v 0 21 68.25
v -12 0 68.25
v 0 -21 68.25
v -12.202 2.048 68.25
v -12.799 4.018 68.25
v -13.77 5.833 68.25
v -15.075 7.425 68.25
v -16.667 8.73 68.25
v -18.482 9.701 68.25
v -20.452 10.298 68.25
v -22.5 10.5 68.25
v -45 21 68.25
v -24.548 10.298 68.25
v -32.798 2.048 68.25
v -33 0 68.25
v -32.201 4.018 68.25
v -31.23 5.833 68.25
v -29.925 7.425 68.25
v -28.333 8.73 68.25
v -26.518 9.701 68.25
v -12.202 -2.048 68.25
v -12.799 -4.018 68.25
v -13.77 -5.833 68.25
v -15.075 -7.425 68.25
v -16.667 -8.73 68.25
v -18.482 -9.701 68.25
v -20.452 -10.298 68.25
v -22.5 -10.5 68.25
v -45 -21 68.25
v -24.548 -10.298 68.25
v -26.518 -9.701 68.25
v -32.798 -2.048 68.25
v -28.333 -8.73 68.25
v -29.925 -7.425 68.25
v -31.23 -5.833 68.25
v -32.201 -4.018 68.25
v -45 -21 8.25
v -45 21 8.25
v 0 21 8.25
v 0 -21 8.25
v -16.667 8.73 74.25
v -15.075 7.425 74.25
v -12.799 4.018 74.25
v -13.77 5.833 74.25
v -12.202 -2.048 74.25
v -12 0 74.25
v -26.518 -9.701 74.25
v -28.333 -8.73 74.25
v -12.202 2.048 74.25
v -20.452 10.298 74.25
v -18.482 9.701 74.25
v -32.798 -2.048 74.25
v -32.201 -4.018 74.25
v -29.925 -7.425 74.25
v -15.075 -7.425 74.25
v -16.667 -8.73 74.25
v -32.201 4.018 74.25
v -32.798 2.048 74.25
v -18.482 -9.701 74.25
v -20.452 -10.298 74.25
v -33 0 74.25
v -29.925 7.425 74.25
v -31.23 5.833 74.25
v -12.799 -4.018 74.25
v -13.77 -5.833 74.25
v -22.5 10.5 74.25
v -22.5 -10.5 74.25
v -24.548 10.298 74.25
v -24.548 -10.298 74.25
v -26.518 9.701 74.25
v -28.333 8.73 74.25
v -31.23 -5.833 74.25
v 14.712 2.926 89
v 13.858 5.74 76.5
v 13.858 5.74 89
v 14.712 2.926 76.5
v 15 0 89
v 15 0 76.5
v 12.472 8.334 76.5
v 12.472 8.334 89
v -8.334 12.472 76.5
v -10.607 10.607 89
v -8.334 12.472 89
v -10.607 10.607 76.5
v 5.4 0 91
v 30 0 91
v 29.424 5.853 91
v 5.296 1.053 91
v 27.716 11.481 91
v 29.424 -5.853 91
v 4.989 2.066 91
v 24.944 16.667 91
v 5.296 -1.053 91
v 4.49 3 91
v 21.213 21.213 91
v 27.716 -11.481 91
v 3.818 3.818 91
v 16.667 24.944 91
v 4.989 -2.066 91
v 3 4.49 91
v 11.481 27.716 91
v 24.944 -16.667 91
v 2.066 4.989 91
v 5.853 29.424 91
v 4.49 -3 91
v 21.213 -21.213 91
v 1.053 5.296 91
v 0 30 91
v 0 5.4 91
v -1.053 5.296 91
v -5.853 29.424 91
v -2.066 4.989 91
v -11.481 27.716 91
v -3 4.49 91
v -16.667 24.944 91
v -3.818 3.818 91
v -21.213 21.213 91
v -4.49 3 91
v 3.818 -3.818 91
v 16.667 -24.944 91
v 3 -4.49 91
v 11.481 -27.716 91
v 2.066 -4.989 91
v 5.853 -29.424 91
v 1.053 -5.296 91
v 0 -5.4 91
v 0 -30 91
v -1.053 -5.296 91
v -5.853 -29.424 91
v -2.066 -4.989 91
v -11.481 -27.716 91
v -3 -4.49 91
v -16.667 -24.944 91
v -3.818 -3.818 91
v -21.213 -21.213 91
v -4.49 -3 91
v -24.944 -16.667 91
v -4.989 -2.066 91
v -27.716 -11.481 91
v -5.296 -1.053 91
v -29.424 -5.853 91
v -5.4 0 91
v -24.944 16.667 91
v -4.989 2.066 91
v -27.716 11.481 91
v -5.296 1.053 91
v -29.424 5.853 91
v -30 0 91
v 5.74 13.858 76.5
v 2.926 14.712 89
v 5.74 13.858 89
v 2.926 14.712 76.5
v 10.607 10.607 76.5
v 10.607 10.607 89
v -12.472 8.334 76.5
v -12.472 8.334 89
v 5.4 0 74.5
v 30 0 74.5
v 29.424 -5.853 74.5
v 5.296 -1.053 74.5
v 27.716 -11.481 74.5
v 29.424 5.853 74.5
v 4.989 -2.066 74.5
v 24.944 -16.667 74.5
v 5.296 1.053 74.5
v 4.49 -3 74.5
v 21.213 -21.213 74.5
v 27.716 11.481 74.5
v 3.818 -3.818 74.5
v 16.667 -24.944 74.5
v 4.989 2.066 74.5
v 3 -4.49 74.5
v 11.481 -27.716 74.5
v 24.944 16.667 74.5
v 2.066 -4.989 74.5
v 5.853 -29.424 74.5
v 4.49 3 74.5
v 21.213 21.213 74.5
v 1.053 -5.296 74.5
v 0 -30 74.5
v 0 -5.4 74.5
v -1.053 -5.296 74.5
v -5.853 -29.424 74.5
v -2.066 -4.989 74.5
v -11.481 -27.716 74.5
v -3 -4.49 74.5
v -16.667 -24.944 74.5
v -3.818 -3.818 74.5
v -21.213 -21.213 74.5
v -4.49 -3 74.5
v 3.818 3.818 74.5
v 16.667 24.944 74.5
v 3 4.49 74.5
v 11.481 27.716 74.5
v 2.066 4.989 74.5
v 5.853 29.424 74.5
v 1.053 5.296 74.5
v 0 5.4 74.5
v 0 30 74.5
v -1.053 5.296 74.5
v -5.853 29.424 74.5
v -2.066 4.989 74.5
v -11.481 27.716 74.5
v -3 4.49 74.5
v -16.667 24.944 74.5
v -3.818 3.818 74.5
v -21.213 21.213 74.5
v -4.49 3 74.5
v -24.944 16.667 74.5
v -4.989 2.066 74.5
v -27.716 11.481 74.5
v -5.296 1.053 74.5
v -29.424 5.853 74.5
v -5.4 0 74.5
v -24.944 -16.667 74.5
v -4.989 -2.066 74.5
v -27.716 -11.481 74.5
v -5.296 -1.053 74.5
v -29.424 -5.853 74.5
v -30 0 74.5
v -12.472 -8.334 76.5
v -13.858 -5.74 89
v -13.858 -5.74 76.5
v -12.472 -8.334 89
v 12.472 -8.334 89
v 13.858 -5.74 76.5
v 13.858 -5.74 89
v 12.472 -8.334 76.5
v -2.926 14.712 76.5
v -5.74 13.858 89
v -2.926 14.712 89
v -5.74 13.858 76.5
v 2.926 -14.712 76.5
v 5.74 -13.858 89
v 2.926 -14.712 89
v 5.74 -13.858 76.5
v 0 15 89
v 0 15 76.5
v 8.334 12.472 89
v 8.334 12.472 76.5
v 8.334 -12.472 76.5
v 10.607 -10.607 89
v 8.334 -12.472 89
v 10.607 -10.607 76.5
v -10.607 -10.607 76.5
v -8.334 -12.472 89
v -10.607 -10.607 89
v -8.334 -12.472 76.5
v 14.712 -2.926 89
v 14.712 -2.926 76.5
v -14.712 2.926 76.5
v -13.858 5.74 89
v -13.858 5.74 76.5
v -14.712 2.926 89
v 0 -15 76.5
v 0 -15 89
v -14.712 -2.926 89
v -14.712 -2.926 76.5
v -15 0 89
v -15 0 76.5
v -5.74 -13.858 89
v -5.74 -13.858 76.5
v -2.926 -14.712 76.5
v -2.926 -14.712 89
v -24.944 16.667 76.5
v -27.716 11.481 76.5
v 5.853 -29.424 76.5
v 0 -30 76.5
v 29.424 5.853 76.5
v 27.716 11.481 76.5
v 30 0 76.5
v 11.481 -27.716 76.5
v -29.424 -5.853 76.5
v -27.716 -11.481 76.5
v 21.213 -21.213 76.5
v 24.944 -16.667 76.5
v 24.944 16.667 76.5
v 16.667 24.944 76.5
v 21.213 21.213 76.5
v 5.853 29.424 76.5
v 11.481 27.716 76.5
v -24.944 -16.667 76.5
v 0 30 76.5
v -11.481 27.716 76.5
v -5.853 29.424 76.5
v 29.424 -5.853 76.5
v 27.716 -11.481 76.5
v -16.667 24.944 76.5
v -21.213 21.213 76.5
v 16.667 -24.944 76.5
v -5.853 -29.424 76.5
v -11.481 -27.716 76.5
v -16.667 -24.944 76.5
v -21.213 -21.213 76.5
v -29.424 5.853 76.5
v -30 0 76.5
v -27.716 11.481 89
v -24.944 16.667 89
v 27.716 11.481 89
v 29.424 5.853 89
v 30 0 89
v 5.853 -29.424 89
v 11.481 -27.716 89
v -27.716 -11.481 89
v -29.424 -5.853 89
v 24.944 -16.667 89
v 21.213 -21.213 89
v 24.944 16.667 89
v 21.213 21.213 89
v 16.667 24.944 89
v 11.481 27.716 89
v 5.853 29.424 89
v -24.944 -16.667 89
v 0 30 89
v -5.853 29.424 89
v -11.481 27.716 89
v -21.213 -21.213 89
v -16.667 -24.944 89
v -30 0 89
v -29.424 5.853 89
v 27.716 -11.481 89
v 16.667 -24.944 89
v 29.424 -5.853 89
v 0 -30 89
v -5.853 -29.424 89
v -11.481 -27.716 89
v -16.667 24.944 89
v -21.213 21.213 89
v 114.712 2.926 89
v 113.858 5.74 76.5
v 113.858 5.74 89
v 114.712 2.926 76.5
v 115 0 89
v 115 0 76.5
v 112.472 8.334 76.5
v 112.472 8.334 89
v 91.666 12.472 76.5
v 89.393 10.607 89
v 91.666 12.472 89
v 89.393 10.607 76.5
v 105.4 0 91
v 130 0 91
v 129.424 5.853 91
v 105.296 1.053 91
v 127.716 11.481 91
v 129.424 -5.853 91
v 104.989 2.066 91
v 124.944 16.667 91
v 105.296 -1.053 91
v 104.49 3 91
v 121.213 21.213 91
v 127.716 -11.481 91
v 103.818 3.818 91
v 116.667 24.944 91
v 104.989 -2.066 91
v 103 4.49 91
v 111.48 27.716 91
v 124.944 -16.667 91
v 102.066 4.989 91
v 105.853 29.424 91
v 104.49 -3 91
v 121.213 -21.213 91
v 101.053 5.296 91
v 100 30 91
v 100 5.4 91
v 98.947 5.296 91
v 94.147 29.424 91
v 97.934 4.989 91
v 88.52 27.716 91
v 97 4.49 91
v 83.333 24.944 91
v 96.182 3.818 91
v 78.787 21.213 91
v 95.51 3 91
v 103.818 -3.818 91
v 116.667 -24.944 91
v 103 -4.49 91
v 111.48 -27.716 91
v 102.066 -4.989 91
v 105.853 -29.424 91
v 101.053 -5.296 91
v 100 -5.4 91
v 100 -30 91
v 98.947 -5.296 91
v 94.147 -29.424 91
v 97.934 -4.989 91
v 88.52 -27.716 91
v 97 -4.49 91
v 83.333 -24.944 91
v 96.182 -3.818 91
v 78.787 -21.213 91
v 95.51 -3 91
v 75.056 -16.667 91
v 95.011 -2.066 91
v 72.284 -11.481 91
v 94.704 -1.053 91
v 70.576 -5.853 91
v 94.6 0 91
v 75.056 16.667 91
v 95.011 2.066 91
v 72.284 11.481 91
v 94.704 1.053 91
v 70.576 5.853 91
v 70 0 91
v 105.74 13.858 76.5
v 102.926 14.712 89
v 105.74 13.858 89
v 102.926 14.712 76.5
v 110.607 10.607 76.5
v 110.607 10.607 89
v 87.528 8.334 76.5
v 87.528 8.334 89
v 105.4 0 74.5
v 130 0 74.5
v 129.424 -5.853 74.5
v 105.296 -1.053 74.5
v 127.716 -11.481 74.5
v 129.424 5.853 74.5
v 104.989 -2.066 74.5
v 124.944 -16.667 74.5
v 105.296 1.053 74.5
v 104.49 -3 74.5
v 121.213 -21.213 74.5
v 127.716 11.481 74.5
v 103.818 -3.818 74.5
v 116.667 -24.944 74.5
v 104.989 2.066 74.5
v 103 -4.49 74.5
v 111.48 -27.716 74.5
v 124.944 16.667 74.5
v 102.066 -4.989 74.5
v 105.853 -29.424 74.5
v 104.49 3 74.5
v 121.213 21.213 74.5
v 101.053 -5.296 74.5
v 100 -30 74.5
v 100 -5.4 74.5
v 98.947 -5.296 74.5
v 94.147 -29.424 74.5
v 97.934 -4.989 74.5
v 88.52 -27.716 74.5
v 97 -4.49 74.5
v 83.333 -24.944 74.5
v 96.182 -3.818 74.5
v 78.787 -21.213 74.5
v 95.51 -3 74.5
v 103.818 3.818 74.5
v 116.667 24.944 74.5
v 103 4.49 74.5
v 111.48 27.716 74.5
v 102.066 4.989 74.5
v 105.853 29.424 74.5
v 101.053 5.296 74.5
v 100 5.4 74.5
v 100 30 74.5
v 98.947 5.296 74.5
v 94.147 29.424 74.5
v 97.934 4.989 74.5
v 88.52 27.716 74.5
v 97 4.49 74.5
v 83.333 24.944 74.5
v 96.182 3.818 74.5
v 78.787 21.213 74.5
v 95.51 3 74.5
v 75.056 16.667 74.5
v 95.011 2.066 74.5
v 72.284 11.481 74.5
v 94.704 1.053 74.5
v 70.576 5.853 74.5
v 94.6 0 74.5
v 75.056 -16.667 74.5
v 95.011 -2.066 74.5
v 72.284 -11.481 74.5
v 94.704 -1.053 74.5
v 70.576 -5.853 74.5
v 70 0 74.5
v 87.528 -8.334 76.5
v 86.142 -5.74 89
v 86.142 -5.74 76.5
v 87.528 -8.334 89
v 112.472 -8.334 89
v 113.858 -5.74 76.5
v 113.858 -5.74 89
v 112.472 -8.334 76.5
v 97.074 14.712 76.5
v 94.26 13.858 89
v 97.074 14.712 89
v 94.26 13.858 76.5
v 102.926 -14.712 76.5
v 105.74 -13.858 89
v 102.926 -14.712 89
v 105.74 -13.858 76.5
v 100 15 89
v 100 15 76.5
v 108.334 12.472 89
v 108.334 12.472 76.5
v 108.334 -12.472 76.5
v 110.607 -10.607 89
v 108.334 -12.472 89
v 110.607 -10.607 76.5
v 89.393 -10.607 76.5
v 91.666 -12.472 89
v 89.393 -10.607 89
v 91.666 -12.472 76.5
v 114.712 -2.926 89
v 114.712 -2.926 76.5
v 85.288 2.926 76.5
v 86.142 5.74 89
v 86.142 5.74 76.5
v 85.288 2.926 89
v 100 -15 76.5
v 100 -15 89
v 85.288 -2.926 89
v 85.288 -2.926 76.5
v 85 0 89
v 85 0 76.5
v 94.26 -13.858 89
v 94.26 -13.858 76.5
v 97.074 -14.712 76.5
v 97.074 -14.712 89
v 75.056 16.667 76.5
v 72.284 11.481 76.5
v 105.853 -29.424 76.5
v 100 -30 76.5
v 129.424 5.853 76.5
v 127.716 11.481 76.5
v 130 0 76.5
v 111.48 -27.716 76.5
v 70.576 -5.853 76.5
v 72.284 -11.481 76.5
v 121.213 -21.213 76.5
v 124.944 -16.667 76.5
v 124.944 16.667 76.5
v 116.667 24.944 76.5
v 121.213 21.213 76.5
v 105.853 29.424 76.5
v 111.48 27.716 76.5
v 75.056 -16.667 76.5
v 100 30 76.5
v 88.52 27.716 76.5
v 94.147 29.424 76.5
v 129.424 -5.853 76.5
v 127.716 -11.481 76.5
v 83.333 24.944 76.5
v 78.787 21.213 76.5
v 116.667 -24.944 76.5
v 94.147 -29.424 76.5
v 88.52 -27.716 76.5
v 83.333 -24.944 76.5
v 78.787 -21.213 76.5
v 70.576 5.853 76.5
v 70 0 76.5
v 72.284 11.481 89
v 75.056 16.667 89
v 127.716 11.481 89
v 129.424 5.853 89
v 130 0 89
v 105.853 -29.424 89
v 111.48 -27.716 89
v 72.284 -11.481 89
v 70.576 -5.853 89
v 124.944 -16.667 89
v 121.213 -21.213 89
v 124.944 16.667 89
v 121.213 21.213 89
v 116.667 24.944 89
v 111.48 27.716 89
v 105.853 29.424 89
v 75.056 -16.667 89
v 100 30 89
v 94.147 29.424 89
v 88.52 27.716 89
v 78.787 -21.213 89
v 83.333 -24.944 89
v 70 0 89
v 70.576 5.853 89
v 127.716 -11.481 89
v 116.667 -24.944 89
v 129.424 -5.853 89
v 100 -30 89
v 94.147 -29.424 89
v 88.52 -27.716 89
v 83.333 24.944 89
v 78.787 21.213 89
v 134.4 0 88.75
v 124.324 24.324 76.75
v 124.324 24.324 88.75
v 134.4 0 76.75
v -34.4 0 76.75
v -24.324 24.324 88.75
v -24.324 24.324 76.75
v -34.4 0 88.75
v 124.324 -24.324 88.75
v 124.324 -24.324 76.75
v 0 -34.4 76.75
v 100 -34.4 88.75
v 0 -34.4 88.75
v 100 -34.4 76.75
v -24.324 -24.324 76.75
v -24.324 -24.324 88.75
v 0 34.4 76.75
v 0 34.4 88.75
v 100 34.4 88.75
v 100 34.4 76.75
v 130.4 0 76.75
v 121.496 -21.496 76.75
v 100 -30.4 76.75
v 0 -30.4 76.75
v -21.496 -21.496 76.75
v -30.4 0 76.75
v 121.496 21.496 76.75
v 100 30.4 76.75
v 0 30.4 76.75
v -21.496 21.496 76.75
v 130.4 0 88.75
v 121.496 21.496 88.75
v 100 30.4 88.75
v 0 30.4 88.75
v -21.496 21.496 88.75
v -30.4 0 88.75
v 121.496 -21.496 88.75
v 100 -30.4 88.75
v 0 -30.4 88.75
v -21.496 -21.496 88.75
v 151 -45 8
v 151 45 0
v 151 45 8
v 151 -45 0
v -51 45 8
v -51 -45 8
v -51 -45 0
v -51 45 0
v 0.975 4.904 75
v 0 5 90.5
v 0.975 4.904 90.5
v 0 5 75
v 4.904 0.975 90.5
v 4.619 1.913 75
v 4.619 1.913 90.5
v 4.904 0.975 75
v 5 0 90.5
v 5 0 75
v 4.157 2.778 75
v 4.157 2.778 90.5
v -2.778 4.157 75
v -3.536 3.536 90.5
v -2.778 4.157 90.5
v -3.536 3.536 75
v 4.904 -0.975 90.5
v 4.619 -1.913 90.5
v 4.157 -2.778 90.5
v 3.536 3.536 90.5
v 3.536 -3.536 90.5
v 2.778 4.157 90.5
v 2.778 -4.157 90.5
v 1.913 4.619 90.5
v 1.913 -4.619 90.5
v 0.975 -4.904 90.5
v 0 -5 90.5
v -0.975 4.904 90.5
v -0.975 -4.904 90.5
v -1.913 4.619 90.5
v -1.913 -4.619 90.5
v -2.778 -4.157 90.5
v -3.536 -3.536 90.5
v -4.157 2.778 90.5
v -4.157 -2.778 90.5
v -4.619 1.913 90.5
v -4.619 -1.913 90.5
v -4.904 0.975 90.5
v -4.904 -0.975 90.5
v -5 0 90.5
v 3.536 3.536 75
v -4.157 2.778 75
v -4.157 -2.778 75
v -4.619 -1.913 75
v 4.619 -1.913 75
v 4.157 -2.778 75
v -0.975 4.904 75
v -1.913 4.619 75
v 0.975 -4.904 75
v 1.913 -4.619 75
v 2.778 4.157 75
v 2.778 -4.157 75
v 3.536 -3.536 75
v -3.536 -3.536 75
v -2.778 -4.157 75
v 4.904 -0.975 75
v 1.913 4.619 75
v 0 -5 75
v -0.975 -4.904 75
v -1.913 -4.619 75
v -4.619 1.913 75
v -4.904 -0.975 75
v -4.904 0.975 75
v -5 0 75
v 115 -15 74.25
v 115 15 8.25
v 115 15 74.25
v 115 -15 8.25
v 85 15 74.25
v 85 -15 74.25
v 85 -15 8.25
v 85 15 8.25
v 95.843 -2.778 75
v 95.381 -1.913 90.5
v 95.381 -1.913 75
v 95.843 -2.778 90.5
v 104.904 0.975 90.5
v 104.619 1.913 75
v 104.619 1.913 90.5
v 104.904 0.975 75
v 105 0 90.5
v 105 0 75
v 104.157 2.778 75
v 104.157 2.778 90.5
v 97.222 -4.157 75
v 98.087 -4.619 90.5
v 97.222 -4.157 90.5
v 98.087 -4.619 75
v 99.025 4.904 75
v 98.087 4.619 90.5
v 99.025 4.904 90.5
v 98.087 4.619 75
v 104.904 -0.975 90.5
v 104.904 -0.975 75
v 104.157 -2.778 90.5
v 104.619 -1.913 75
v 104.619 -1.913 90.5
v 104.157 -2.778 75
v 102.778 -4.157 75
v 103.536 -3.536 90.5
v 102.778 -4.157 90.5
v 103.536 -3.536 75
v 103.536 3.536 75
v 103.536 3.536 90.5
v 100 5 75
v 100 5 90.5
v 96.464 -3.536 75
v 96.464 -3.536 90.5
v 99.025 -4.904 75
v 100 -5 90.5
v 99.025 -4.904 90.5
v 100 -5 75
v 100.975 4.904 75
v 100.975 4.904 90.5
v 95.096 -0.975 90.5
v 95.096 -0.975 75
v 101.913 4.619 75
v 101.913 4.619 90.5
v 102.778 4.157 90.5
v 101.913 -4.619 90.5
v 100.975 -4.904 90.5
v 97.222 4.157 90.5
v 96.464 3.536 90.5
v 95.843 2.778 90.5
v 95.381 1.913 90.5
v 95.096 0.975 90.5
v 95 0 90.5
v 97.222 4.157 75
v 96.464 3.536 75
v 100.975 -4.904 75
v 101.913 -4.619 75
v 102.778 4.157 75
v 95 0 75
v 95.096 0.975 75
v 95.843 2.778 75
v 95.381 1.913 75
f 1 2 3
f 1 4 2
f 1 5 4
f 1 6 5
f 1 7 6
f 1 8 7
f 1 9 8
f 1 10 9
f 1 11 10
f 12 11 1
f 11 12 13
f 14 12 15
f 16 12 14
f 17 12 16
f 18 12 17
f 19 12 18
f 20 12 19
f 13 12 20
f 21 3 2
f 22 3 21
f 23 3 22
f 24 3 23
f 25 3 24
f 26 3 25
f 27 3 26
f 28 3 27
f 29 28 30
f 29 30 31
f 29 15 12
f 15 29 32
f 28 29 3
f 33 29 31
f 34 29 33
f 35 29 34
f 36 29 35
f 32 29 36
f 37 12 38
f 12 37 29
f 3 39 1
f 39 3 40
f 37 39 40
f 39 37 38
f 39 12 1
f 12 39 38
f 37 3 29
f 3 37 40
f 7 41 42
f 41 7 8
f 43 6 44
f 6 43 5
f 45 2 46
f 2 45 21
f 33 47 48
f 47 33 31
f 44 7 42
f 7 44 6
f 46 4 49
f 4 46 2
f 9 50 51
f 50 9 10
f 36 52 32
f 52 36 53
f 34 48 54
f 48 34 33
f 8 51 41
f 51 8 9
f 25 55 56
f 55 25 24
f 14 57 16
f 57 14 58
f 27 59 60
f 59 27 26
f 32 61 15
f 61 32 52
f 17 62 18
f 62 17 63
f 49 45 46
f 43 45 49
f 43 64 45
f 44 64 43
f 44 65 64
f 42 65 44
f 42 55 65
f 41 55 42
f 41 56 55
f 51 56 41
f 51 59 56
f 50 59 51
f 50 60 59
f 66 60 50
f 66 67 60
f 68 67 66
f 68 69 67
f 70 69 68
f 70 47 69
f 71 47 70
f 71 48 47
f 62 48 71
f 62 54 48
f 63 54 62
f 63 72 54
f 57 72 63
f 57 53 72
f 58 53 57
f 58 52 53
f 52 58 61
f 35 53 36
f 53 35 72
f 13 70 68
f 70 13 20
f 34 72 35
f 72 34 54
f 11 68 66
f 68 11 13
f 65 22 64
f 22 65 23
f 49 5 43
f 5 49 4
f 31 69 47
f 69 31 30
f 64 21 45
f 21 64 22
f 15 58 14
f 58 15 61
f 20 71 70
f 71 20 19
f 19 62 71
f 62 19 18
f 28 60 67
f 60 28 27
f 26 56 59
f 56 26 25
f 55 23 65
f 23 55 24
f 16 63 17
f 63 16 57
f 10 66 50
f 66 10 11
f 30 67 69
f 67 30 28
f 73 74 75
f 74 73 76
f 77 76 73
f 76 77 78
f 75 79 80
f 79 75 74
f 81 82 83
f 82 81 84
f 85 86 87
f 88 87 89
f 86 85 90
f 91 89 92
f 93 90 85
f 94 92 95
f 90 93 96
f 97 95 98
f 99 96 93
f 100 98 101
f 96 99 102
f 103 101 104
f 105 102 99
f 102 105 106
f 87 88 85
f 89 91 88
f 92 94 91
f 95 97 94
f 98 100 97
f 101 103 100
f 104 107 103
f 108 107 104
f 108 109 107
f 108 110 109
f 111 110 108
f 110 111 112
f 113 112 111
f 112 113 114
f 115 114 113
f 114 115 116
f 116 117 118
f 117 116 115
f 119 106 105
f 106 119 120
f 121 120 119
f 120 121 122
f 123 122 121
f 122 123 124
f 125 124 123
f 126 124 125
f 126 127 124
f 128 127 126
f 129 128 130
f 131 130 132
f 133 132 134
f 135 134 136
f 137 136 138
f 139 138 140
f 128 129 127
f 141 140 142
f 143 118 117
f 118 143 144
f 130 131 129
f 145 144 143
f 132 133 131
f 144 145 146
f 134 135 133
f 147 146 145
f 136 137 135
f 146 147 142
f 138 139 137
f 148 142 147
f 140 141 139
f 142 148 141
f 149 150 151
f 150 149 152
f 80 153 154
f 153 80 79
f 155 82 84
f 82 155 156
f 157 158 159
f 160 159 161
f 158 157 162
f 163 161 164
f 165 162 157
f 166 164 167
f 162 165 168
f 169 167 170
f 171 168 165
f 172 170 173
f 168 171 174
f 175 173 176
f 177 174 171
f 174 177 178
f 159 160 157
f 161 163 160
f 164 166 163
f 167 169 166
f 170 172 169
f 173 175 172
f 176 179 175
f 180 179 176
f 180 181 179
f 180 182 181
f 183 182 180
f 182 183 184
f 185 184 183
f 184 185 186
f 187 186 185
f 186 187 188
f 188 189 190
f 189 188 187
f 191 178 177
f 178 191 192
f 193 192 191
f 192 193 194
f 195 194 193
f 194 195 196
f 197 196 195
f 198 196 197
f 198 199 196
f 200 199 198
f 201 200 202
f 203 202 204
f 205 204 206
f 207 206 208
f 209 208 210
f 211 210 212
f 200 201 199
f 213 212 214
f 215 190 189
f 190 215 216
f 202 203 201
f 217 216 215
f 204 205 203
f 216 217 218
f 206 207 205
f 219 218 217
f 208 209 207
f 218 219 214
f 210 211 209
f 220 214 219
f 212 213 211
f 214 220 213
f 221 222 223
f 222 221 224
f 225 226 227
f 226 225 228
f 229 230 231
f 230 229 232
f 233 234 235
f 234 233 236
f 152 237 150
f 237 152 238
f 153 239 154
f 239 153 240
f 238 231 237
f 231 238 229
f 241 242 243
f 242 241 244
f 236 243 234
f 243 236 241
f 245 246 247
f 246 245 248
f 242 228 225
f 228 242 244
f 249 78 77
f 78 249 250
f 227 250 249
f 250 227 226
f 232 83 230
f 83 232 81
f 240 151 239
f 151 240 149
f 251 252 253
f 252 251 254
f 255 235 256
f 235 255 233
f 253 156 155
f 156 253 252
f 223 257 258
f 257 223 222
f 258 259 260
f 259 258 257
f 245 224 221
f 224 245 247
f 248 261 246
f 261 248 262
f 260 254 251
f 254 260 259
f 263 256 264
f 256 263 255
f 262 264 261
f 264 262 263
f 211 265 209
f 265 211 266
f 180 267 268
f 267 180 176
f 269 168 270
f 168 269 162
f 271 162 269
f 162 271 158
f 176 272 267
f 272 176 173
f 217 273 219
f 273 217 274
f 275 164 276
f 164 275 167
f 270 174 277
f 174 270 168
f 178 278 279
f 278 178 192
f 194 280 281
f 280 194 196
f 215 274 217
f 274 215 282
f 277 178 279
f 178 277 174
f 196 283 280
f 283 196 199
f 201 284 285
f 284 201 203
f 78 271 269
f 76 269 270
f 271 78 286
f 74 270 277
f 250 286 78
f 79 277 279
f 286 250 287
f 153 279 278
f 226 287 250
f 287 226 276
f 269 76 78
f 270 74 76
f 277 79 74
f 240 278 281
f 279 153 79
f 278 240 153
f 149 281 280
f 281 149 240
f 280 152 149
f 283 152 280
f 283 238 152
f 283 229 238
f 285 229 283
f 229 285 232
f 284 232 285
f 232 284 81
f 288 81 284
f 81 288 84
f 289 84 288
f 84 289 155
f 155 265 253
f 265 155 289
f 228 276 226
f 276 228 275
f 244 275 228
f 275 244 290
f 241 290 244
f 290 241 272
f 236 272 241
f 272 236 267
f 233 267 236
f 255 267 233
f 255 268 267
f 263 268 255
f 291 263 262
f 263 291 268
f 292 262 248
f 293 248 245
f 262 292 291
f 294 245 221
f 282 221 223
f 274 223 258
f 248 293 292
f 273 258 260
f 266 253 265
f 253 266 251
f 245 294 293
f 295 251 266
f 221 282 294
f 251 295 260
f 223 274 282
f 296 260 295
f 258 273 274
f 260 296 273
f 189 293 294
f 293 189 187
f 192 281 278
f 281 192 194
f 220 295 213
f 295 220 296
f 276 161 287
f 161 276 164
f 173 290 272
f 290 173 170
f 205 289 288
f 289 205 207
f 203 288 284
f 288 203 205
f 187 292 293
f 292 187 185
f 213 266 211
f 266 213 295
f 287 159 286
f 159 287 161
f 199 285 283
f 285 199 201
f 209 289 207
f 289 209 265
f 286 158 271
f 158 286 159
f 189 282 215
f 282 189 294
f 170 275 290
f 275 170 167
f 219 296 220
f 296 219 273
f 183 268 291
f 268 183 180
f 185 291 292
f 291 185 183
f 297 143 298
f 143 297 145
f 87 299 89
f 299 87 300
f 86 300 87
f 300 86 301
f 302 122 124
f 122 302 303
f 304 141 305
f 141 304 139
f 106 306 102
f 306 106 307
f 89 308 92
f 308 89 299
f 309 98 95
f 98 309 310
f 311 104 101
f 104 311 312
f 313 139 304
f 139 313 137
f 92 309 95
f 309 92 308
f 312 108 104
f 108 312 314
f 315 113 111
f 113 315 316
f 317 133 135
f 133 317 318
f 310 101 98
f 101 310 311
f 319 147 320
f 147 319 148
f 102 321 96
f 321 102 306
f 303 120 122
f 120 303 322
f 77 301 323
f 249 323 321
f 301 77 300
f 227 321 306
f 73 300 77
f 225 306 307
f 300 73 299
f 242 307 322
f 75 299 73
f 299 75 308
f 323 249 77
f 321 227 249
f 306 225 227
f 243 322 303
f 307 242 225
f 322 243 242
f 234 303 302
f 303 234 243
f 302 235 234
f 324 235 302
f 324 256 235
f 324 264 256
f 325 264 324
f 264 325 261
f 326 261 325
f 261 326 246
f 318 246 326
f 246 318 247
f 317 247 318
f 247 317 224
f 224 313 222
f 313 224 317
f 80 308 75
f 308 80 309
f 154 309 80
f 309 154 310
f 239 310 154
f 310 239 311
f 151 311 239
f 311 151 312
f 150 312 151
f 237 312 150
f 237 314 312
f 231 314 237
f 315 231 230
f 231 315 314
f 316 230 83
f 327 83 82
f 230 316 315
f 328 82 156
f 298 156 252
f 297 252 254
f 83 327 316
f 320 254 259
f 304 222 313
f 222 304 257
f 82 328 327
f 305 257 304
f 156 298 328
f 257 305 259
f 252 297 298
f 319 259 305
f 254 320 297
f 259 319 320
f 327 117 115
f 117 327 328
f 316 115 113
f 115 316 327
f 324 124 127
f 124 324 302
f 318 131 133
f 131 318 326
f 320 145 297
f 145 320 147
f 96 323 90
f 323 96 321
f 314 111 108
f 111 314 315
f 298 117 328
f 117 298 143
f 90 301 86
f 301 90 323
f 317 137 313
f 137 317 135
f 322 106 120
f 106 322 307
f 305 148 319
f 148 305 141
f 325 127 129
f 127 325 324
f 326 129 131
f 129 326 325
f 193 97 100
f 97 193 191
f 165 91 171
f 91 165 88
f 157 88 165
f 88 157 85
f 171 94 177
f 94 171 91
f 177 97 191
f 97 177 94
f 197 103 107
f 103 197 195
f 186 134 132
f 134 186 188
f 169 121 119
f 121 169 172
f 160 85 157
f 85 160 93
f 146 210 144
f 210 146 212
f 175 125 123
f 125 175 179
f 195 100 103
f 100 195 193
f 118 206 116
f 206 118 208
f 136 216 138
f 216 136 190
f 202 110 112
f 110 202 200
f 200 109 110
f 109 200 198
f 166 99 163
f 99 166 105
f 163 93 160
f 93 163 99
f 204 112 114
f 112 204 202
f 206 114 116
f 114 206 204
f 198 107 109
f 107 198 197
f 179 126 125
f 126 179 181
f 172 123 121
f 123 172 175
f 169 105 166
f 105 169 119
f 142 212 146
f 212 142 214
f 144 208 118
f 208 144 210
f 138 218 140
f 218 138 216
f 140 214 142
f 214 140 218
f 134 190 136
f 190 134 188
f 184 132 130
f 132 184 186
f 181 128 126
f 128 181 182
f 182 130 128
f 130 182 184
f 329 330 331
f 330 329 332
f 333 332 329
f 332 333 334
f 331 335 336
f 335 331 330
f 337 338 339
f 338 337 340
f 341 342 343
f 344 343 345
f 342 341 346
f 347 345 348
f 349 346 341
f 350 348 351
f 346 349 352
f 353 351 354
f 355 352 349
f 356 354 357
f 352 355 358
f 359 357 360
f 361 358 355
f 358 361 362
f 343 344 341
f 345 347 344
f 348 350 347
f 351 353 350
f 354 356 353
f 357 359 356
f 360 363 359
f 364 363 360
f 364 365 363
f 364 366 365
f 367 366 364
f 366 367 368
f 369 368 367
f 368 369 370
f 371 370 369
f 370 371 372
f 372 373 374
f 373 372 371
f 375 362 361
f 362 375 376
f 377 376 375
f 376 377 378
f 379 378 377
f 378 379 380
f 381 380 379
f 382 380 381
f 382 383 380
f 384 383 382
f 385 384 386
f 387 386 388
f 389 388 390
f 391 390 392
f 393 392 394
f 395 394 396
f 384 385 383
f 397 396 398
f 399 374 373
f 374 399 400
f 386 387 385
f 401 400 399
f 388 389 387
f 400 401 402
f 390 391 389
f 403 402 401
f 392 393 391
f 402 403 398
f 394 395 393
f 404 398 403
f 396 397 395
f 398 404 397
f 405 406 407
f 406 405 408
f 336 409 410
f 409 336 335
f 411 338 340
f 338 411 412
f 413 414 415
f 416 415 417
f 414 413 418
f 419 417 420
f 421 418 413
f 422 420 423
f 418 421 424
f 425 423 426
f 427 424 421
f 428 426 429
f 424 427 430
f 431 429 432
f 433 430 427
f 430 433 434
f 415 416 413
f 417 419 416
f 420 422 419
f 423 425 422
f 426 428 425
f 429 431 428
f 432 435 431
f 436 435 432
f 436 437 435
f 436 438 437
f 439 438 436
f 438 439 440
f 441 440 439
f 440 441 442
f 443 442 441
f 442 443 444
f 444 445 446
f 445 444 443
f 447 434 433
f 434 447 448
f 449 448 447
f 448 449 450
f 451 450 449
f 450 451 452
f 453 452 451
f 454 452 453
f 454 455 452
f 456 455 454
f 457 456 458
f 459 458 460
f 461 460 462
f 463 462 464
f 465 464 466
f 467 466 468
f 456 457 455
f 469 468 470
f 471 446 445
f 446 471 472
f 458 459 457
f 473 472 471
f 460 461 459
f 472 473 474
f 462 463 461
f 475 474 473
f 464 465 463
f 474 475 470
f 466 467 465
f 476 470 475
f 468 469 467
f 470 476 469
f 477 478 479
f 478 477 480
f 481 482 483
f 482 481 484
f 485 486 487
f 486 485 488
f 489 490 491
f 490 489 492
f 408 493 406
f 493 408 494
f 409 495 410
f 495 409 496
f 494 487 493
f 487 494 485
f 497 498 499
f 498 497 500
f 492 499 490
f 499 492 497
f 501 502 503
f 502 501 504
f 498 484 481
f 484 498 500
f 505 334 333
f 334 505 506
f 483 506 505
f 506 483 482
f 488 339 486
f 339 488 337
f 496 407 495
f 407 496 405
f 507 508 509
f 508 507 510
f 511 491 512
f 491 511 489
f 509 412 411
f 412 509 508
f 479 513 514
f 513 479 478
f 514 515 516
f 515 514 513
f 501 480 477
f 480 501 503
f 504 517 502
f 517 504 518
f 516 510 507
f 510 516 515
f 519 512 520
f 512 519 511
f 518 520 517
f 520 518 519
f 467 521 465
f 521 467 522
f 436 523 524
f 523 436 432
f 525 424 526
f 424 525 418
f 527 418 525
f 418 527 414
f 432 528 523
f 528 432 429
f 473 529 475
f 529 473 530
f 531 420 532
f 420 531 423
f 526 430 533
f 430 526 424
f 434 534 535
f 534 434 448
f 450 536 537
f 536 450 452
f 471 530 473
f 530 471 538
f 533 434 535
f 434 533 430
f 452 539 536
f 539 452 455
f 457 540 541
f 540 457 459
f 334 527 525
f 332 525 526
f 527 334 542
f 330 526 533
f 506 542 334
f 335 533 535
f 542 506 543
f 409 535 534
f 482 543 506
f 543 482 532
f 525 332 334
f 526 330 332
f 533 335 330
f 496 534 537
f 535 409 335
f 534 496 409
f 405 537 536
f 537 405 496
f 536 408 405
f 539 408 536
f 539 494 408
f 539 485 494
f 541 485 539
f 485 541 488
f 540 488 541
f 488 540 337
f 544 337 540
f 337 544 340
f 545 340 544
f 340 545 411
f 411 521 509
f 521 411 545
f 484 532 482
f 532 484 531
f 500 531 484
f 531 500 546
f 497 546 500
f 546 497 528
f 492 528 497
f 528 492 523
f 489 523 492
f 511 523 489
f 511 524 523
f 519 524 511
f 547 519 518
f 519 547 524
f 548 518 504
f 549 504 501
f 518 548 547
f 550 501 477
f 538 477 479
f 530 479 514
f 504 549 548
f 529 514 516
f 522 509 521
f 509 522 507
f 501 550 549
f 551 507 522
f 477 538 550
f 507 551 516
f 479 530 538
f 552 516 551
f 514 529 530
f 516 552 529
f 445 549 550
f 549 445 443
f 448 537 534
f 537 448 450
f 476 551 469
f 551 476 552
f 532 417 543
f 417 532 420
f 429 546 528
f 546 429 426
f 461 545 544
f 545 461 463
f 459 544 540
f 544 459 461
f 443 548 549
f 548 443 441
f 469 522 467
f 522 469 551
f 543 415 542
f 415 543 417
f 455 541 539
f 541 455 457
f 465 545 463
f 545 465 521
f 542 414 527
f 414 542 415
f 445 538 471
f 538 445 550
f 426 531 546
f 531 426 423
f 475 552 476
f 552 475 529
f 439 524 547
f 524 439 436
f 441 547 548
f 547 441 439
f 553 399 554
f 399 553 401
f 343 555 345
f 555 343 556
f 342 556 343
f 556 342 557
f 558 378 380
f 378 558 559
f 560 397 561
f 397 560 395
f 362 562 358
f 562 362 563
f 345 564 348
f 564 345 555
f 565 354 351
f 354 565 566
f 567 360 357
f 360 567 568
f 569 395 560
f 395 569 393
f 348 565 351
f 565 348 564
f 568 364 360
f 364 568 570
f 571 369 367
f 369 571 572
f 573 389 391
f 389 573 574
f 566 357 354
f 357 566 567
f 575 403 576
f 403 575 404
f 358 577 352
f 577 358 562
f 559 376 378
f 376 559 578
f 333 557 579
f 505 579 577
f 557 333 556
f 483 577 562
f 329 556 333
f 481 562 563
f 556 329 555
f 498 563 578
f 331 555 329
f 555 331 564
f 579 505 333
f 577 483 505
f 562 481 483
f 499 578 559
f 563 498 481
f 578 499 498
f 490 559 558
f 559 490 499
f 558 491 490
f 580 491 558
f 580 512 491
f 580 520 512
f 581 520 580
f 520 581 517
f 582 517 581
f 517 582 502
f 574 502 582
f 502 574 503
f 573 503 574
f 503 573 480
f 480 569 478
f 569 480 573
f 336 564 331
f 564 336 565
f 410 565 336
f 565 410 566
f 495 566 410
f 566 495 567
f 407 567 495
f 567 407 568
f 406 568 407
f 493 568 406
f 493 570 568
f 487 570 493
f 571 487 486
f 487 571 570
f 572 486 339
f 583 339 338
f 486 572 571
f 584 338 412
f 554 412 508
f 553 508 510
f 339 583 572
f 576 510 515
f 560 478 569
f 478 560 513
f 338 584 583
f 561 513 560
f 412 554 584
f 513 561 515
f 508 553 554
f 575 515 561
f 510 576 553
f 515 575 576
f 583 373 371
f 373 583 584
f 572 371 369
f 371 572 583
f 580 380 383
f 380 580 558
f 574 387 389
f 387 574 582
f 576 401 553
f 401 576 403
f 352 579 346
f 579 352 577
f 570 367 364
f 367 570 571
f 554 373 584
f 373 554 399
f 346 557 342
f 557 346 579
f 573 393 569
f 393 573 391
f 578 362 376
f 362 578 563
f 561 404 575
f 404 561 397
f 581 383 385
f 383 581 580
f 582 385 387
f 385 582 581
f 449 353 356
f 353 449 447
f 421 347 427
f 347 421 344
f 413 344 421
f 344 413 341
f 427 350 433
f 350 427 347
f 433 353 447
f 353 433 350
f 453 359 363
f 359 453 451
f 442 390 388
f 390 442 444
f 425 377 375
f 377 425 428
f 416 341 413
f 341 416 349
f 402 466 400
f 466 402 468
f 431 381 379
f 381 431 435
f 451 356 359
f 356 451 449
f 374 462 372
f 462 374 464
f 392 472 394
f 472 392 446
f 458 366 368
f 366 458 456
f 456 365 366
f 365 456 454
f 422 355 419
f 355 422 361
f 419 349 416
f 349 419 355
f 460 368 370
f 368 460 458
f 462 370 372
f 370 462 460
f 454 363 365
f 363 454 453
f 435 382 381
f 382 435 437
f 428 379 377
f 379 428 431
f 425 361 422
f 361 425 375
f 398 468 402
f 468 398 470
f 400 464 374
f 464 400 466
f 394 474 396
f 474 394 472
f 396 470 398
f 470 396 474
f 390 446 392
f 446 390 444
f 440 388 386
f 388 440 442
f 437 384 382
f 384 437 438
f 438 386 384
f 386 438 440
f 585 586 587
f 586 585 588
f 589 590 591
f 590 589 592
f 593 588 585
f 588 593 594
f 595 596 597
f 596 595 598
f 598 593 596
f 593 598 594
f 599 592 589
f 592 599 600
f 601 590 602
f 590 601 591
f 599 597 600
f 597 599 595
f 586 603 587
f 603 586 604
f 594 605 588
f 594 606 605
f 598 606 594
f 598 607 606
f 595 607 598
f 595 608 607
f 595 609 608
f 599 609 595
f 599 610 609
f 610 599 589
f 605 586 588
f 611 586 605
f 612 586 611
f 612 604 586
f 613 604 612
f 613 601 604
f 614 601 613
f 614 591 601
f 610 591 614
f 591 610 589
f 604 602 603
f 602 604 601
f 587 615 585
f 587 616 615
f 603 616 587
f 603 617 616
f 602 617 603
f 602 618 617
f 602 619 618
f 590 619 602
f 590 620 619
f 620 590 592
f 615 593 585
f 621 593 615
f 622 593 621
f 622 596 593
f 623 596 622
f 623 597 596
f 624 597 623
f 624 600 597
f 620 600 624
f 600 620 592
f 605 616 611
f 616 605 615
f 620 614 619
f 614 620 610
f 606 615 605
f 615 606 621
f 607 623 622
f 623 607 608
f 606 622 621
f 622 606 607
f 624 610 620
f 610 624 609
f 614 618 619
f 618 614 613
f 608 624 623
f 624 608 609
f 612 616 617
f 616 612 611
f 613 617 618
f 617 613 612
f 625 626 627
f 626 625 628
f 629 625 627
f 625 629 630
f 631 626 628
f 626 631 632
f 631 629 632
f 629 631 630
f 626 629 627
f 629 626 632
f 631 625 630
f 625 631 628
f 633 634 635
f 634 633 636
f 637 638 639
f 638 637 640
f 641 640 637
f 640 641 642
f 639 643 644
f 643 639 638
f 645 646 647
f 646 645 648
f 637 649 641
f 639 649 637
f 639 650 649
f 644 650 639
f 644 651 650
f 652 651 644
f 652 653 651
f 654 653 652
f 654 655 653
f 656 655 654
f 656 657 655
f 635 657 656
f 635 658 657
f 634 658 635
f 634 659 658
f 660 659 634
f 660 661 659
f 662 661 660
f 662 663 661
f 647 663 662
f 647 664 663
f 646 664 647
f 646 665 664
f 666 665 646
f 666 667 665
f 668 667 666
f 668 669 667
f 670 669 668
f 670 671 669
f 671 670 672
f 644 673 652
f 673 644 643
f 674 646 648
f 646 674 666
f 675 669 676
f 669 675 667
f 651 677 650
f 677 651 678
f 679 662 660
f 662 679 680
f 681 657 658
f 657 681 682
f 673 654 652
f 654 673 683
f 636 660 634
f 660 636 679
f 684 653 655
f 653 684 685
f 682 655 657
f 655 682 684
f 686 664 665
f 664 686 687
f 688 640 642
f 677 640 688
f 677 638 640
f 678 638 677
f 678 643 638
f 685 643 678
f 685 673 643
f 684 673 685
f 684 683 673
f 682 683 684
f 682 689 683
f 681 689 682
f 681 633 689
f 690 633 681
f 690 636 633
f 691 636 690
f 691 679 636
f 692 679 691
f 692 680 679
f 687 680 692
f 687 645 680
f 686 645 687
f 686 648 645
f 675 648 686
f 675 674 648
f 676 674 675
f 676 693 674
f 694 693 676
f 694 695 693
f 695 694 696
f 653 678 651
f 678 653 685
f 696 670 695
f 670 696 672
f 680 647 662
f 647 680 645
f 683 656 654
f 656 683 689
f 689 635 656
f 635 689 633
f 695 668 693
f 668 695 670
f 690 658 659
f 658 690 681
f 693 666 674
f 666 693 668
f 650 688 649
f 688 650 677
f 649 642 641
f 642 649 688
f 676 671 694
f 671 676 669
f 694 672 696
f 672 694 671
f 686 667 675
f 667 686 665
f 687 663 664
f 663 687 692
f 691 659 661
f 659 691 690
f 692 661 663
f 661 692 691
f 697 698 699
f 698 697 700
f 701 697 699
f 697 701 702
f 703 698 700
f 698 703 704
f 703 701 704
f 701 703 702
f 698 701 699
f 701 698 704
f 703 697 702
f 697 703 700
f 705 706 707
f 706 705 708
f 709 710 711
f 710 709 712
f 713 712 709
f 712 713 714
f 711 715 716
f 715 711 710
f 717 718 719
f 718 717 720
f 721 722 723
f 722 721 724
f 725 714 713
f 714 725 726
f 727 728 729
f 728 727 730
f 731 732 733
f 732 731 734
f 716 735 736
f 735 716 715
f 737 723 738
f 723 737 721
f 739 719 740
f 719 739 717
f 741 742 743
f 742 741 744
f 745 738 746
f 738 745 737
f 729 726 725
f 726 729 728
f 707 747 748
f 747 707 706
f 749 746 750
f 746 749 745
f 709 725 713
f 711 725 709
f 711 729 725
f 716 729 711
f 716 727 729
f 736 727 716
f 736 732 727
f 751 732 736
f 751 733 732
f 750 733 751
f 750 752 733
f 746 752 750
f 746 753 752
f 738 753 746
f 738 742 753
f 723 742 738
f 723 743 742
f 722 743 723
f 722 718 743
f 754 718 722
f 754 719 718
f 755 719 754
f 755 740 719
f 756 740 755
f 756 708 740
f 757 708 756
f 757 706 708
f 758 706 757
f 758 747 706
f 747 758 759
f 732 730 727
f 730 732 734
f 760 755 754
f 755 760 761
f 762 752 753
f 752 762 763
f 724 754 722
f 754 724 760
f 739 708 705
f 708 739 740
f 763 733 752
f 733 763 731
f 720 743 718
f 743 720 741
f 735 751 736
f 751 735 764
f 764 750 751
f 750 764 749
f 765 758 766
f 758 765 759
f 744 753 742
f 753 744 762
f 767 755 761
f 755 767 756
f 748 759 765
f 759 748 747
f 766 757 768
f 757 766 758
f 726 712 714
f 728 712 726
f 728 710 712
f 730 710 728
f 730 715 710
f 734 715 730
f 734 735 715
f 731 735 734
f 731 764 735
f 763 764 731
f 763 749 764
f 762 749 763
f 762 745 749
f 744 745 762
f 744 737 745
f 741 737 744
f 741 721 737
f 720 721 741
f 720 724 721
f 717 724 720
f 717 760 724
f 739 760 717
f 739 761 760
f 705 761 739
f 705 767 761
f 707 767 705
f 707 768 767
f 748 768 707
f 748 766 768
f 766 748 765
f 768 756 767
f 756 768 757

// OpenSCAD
$fn = 32;

// ------------------------------------------------------------------------
// Motor belt drive: span 100 mm, pulleys d60, belt 12 mm wide
// Every part is its own module, assembly() places every instance.
// ------------------------------------------------------------------------

// --- part 1 ---
module base_plate() {
  difference() {
    translate([-101, -45, 0]) cube([202, 90, 8]);
  }
}

// --- part 2 ---
module motor() {
  union() {
    translate([-30, -21, 0]) cube([60, 42, 45]);
    translate([33, 0, 22.5]) rotate([0, 90, 0]) cylinder(h = 6, d = 21, center = true);
  }
}

// --- part 3 ---
module drive_shaft() {
  translate([0, 0, -7.75]) cylinder(h = 15.5, d = 10);
}

// --- part 4 ---
module pulley_drive() {
  difference() {
    union() {
      cylinder(h = 16.5, d = 30);
      cylinder(h = 2, d = 60);
      translate([0, 0, 14.5]) cylinder(h = 2, d = 60);
    }
    translate([0, 0, -1]) cylinder(h = 18.5, d = 10.8);
  }
}

// --- part 5 ---
module idler_post() {
  translate([-15, -15, 0]) cube([30, 30, 66]);
}

// --- part 6 ---
module driven_shaft() {
  translate([0, 0, -7.75]) cylinder(h = 15.5, d = 10);
}

// --- part 7 ---
module pulley_driven() {
  difference() {
    union() {
      cylinder(h = 16.5, d = 30);
      cylinder(h = 2, d = 60);
      translate([0, 0, 14.5]) cylinder(h = 2, d = 60);
    }
    translate([0, 0, -1]) cylinder(h = 18.5, d = 10.8);
  }
}

// --- part 8 ---
module drive_belt() {
  difference() {
    linear_extrude(height = 12) polygon(points = concat([for (a = [90 : 45 : 270]) [34.4 * cos(a), 34.4 * sin(a)]], [for (a = [270 : 45 : 450]) [100 + 34.4 * cos(a), 34.4 * sin(a)]]));
    translate([0, 0, -1]) linear_extrude(height = 14) polygon(points = concat([for (a = [90 : 45 : 270]) [30.4 * cos(a), 30.4 * sin(a)]], [for (a = [270 : 45 : 450]) [100 + 30.4 * cos(a), 30.4 * sin(a)]]));
  }
}

// --- assembly ---
module assembly() {
  color([0.80, 0.24, 0.20]) translate([50, 0, 0]) rotate([0, 0, 0]) base_plate();
  color([0.20, 0.45, 0.75]) translate([0, 0, 38.25]) rotate([0, 270, 0]) motor();
  color([0.25, 0.62, 0.32]) translate([0, 0, 82.75]) rotate([0, 0, 0]) drive_shaft();
  color([0.92, 0.70, 0.18]) translate([0, 0, 74.5]) rotate([0, 0, 0]) pulley_drive();
  color([0.58, 0.35, 0.70]) translate([100, 0, 8.25]) rotate([0, 0, 0]) idler_post();
  color([0.16, 0.66, 0.66]) translate([100, 0, 82.75]) rotate([0, 0, 0]) driven_shaft();
  color([0.85, 0.48, 0.18]) translate([100, 0, 74.5]) rotate([0, 0, 0]) pulley_driven();
  color([0.55, 0.60, 0.65]) translate([0, 0, 76.75]) rotate([0, 0, 0]) drive_belt();
}

assembly();
